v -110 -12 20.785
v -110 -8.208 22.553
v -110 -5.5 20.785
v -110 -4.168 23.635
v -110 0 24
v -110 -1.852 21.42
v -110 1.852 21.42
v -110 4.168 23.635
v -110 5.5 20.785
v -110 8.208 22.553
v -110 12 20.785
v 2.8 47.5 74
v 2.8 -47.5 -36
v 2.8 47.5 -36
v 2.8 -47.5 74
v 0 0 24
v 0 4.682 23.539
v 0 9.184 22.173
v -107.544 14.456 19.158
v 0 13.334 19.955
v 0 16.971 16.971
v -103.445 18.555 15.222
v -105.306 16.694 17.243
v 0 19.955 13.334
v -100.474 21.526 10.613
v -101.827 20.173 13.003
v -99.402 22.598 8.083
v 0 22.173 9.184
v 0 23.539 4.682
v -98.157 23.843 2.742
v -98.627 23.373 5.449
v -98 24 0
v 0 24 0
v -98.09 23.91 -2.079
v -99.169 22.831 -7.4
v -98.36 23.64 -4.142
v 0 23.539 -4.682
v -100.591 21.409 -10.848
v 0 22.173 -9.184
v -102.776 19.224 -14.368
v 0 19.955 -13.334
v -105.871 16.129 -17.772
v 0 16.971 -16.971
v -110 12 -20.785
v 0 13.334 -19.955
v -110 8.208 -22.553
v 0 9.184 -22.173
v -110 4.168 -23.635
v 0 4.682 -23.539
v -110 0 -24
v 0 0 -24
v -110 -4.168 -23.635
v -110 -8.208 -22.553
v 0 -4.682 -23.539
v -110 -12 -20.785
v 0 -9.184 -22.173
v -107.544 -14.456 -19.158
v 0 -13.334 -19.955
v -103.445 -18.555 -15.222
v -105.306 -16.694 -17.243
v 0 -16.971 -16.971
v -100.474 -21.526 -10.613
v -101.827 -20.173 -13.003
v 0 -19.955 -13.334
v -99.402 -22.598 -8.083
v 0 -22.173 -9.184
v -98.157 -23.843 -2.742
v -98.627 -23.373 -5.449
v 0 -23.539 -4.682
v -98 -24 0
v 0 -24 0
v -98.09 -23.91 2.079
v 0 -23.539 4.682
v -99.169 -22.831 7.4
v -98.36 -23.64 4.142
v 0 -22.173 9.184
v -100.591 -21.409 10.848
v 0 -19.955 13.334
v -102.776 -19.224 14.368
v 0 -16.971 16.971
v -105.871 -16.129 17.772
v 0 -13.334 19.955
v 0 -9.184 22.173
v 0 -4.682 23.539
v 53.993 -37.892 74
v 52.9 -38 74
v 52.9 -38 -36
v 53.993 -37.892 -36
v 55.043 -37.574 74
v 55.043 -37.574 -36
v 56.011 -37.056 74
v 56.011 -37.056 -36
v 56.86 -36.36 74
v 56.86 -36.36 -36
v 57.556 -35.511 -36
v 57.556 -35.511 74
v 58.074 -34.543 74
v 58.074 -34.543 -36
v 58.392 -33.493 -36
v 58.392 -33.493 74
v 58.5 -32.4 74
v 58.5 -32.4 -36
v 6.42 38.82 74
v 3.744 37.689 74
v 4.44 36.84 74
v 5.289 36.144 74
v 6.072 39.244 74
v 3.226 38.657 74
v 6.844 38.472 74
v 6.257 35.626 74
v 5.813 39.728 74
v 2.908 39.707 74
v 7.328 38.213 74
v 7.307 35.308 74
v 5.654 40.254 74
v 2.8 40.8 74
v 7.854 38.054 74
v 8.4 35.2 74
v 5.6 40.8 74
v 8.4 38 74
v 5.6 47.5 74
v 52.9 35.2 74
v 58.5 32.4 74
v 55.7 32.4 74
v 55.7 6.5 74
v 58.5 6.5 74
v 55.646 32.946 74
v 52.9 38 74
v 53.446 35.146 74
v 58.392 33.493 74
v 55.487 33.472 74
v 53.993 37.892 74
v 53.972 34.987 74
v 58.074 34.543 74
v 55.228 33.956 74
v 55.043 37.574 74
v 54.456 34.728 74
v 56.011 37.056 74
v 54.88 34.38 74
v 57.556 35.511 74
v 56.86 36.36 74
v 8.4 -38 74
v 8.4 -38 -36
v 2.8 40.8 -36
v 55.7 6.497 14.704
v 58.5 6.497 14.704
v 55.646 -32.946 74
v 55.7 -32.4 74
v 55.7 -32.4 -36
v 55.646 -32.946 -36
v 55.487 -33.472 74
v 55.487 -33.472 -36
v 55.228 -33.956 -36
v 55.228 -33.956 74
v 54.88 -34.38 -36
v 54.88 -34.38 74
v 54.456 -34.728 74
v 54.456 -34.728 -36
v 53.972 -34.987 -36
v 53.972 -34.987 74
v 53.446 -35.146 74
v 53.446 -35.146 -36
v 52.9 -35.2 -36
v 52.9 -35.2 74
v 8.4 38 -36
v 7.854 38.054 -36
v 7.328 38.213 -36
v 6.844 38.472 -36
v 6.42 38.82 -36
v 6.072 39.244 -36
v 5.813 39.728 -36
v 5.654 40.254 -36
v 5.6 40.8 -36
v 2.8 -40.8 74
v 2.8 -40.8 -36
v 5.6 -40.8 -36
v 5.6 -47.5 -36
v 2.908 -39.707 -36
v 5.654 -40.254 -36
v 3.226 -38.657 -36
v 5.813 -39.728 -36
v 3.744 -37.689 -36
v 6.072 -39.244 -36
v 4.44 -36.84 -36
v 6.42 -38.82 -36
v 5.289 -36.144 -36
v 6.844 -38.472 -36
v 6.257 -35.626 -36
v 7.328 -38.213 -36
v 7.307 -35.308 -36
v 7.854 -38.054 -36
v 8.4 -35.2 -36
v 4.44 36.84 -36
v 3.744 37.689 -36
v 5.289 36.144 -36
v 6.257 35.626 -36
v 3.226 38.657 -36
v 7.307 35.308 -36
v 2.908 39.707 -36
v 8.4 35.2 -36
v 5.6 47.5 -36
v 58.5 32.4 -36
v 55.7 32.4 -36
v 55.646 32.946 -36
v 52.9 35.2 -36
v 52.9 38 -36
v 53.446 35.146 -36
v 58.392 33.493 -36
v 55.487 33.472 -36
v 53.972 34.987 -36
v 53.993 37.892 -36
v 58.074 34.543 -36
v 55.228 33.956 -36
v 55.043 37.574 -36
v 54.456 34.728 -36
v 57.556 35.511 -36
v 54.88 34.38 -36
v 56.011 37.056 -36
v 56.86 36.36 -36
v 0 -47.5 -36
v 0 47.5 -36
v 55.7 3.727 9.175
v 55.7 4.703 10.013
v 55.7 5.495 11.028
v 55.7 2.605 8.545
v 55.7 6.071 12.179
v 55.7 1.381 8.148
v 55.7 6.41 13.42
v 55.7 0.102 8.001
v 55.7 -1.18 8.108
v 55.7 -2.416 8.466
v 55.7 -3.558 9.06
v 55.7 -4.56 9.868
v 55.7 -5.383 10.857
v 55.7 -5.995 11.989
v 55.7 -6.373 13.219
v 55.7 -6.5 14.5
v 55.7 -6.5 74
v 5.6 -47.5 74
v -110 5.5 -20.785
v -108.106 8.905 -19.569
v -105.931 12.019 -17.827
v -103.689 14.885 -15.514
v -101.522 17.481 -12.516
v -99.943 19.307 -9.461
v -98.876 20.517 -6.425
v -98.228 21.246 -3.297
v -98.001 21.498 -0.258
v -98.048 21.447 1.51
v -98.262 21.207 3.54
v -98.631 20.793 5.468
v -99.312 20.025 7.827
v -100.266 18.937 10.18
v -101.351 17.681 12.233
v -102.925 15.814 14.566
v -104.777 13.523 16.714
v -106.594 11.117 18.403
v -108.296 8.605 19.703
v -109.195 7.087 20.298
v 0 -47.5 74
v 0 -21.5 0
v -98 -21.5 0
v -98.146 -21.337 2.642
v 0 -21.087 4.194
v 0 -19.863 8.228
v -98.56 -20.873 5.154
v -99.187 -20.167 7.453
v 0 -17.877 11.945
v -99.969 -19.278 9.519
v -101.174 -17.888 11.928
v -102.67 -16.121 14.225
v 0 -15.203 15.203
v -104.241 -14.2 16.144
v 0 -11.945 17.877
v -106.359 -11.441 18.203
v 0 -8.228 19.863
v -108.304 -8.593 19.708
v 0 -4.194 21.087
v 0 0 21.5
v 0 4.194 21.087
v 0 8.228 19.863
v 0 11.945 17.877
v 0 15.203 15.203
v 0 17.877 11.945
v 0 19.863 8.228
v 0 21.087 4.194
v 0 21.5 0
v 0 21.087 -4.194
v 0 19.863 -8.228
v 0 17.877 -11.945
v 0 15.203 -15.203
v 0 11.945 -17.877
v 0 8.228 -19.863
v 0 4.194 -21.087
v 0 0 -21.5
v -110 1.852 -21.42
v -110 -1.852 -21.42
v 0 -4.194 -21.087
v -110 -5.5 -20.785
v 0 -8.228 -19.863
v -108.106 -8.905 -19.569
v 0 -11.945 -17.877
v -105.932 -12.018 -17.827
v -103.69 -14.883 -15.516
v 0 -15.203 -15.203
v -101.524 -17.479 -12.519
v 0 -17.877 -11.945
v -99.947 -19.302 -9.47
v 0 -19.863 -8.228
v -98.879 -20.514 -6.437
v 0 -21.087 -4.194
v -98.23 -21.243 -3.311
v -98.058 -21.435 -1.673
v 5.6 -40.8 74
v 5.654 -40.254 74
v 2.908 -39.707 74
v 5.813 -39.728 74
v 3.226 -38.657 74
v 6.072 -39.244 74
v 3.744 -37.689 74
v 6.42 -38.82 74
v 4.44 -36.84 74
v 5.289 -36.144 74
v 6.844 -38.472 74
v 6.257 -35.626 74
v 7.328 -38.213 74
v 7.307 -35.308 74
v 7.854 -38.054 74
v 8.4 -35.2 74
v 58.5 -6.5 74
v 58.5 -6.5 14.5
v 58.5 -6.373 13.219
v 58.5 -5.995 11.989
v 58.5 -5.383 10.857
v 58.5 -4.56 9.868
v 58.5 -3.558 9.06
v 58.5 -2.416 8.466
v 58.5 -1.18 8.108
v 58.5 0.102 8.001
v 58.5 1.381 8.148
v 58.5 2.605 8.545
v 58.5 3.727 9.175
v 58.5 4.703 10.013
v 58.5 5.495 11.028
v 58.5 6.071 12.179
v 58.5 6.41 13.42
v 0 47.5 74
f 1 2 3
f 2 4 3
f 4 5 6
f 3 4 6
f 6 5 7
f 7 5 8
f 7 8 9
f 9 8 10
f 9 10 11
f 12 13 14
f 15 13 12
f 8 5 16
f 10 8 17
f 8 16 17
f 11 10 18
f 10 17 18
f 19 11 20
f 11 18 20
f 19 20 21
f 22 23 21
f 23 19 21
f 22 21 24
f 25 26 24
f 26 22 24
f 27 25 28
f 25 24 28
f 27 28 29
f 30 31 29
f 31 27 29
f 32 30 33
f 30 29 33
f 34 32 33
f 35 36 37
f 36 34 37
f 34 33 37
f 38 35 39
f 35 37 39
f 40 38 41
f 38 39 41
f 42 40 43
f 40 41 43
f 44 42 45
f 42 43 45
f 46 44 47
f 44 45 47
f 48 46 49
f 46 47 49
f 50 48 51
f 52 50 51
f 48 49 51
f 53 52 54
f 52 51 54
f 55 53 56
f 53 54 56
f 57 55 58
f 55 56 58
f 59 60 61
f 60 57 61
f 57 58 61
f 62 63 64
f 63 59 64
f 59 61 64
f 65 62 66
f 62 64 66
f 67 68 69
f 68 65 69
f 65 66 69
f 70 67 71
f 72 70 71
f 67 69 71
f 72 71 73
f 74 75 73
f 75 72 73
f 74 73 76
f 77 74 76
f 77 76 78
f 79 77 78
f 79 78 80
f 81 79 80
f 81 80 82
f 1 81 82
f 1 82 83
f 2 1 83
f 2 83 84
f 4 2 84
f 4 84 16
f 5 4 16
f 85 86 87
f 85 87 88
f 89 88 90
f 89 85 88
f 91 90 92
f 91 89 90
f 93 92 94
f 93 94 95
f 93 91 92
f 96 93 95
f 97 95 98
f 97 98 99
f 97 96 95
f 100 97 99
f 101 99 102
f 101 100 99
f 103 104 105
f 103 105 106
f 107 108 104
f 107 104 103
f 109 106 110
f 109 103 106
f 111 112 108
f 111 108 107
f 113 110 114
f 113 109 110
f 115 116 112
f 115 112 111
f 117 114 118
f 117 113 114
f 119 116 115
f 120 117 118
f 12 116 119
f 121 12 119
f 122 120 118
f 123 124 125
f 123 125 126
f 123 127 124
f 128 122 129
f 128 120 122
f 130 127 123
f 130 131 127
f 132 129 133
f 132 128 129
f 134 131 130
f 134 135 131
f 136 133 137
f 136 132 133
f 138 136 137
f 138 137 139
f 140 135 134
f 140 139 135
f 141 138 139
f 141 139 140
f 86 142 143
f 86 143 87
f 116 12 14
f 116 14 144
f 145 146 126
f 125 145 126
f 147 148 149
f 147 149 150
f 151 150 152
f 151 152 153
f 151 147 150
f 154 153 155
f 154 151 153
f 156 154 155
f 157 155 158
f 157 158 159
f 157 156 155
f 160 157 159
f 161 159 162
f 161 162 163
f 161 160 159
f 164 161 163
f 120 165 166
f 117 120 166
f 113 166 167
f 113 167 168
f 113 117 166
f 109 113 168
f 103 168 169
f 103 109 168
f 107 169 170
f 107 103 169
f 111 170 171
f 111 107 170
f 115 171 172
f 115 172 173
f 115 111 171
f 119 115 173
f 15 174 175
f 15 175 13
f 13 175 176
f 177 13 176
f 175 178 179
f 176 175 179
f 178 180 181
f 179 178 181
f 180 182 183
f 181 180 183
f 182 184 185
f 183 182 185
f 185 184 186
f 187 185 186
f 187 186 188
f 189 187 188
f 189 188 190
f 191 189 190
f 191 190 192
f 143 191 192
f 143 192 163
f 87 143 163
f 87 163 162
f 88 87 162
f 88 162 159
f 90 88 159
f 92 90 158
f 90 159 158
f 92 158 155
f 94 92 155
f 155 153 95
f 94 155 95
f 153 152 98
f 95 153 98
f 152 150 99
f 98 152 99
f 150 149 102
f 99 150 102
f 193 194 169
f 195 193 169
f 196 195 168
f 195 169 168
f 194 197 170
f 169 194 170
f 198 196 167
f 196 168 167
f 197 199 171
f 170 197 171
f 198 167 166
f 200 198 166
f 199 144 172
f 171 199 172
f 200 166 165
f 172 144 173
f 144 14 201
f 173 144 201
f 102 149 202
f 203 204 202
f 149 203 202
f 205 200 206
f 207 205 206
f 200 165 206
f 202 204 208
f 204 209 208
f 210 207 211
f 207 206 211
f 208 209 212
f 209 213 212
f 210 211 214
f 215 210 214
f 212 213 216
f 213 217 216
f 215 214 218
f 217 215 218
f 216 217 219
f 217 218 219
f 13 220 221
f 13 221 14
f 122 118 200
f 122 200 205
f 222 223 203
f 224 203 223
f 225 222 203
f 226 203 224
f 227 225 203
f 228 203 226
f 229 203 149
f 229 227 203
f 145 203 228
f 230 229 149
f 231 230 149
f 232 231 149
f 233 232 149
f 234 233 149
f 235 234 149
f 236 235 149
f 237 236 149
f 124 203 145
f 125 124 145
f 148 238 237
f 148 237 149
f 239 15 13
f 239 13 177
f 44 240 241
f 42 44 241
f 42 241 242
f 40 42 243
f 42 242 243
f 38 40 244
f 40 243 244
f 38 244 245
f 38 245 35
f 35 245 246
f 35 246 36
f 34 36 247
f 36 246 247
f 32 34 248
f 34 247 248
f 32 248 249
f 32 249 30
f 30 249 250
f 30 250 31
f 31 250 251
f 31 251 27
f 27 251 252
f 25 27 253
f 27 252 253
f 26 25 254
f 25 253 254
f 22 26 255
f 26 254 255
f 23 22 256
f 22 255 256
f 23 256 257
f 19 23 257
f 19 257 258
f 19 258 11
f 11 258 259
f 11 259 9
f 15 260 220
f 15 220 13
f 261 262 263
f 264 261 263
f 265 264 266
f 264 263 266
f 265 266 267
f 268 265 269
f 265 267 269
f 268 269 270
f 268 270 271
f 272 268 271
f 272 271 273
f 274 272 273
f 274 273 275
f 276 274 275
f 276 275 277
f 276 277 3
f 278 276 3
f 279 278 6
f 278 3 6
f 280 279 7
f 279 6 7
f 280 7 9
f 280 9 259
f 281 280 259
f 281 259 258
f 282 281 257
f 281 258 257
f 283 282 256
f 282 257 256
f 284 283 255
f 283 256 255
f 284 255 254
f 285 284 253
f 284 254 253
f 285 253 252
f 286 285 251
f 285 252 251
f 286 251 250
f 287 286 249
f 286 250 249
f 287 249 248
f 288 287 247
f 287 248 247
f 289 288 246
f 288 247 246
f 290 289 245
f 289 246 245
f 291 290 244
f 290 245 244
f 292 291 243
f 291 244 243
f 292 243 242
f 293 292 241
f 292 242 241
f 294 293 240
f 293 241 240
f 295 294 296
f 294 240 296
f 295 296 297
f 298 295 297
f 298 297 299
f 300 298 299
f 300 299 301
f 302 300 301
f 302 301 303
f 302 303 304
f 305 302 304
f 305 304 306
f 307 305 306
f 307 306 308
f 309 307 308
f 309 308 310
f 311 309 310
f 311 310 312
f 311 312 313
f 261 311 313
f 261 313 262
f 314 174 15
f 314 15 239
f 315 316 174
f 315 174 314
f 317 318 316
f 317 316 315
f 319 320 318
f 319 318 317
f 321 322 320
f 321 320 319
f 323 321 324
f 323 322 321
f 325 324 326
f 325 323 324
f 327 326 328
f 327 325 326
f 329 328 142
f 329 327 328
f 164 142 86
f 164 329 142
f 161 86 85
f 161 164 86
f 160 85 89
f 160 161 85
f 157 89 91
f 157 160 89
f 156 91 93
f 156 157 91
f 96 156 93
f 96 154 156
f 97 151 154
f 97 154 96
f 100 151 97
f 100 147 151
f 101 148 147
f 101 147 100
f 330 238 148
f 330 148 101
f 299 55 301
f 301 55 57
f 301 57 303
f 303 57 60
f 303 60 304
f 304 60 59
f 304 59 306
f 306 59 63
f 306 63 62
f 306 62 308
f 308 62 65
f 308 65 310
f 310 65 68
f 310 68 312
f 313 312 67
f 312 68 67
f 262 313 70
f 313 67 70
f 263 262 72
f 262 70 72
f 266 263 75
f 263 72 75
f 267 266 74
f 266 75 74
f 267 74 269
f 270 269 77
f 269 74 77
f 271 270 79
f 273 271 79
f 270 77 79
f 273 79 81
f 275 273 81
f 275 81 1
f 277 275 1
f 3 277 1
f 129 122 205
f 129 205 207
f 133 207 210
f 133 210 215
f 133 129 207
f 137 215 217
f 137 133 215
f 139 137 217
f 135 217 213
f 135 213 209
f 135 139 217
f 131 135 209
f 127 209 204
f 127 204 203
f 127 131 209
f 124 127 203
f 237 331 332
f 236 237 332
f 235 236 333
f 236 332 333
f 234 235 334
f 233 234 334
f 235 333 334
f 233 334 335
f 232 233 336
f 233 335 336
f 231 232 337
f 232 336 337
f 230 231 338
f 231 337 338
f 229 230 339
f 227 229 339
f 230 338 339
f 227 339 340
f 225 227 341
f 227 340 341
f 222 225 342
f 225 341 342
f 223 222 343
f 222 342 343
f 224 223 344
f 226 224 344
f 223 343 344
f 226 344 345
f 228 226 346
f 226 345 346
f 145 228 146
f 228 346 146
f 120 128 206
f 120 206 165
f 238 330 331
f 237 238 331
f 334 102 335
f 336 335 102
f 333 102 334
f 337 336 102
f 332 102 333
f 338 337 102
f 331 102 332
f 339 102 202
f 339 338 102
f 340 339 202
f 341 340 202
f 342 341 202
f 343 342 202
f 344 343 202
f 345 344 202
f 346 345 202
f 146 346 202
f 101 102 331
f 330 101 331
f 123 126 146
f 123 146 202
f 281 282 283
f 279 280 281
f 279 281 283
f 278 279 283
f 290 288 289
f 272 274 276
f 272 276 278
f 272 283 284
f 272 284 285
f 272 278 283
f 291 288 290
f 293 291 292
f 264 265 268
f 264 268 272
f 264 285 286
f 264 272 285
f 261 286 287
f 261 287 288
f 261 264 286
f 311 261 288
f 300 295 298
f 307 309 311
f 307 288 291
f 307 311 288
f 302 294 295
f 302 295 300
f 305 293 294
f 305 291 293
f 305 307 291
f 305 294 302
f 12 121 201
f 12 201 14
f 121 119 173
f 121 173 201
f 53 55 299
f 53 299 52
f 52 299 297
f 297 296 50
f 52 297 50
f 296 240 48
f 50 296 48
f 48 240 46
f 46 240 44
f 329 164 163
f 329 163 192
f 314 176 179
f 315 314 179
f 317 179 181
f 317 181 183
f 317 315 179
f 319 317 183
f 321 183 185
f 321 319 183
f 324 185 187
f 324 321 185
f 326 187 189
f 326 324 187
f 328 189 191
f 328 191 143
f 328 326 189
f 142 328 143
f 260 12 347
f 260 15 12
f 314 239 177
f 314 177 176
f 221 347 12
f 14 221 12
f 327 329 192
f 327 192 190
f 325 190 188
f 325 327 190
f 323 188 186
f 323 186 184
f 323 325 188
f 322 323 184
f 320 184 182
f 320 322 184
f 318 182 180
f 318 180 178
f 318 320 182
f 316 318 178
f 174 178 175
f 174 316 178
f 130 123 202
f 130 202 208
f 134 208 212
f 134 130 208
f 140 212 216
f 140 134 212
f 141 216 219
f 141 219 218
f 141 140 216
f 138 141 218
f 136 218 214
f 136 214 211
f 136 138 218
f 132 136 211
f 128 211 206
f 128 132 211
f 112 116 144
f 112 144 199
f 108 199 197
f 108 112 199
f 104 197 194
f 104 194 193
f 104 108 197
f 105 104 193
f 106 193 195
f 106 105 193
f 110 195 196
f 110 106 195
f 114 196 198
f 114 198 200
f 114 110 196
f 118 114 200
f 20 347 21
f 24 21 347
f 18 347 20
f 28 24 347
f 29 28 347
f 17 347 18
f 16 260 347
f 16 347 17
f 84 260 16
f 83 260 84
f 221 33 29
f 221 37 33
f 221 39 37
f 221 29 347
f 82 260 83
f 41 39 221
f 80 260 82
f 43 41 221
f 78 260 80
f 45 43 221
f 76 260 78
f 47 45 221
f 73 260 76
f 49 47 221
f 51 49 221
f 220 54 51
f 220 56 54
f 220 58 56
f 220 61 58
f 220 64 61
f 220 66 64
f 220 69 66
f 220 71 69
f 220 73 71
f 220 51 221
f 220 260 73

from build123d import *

# Parameters (mm, degrees)
F0_W      = 110
F0_H      = 24
F4_R      = 21.5
F5_DEPTH  = 110.001
F2_R      = 24
F6_DEPTH  = 25
F8_DEPTH  = 47.5
F10_DEPTH = 110
F12_DEPTH = 10


with BuildPart() as f1:
    # F0 (on Front) → F1 (revolve)
    with BuildSketch(Plane.XZ):
        with Locations((-55, 12)):
            Rectangle(F0_W, F0_H)
    revolve(axis=Axis((-55, 0, 0), (-1, 0, 0)))

    # F4 (on face) → F5 (cut, through all)
    with BuildSketch(Plane(origin=(-110, 0, 0), x_dir=(0, -1, 0), z_dir=(-1, 0, 0))):
        Circle(F4_R)
    extrude(amount=-F5_DEPTH, mode=Mode.SUBTRACT)

    # F2 (on Front) → F6 (cut, symmetric)
    with BuildSketch(Plane.XZ):
        with Locations((-122, 0)):
            Circle(F2_R)
    extrude(amount=F6_DEPTH, both=True, mode=Mode.SUBTRACT)

    # F7 (on Front) → F8 (join, symmetric)
    with BuildSketch(Plane.XZ):
        Polygon((0, 74), (0, 0), (0, -36), (2.8, -36), (2.8, 74), align=None)
    extrude(amount=F8_DEPTH, both=True)


with BuildPart() as f10:
    # F9 (on face) → F10 (new body)
    with BuildSketch(Plane.XY.offset(74)):
        with BuildLine():
            ThreePointArc((55.7, -32.4), (54.879899, -34.379899), (52.9, -35.2))
            Line((52.9, -35.2), (8.4, -35.2))
            ThreePointArc((8.4, -35.2), (4.440202, -36.840202), (2.8, -40.8))
            Line((2.8, -40.8), (2.8, -47.5))
            Line((2.8, -47.5), (5.6, -47.5))
            Line((5.6, -47.5), (5.6, -40.8))
            ThreePointArc((5.6, -40.8), (6.420101, -38.820101), (8.4, -38))
            Line((8.4, -38), (52.9, -38))
            ThreePointArc((52.9, -38), (56.859798, -36.359798), (58.5, -32.4))
            Line((58.5, -32.4), (58.5, 32.4))
            ThreePointArc((58.5, 32.4), (56.859798, 36.359798), (52.9, 38))
            Line((52.9, 38), (8.4, 38))
            ThreePointArc((8.4, 38), (6.420101, 38.820101), (5.6, 40.8))
            Line((5.6, 40.8), (5.6, 47.5))
            Line((5.6, 47.5), (2.8, 47.5))
            Line((2.8, 47.5), (2.8, 40.8))
            ThreePointArc((2.8, 40.8), (4.440202, 36.840202), (8.4, 35.2))
            Line((8.4, 35.2), (52.9, 35.2))
            ThreePointArc((52.9, 35.2), (54.879899, 34.379899), (55.7, 32.4))
            Line((55.7, 32.4), (55.7, -32.4))
        make_face()
    extrude(amount=-F10_DEPTH)

    # F11 (on face) → F12 (cut)
    with BuildSketch(Plane.YZ.offset(58.5)):
        with BuildLine():
            Line((-6.5, 74), (-6.5, 14.5))
            ThreePointArc((-6.5, 14.5), (0.102206, 8.000804), (6.496786, 14.704387))
            Line((6.496786, 14.704387), (6.5, 74))
            Line((6.5, 74), (-6.5, 74))
        make_face()
    extrude(amount=-F12_DEPTH, mode=Mode.SUBTRACT)


solid = Compound([f1.part, f10.part])
